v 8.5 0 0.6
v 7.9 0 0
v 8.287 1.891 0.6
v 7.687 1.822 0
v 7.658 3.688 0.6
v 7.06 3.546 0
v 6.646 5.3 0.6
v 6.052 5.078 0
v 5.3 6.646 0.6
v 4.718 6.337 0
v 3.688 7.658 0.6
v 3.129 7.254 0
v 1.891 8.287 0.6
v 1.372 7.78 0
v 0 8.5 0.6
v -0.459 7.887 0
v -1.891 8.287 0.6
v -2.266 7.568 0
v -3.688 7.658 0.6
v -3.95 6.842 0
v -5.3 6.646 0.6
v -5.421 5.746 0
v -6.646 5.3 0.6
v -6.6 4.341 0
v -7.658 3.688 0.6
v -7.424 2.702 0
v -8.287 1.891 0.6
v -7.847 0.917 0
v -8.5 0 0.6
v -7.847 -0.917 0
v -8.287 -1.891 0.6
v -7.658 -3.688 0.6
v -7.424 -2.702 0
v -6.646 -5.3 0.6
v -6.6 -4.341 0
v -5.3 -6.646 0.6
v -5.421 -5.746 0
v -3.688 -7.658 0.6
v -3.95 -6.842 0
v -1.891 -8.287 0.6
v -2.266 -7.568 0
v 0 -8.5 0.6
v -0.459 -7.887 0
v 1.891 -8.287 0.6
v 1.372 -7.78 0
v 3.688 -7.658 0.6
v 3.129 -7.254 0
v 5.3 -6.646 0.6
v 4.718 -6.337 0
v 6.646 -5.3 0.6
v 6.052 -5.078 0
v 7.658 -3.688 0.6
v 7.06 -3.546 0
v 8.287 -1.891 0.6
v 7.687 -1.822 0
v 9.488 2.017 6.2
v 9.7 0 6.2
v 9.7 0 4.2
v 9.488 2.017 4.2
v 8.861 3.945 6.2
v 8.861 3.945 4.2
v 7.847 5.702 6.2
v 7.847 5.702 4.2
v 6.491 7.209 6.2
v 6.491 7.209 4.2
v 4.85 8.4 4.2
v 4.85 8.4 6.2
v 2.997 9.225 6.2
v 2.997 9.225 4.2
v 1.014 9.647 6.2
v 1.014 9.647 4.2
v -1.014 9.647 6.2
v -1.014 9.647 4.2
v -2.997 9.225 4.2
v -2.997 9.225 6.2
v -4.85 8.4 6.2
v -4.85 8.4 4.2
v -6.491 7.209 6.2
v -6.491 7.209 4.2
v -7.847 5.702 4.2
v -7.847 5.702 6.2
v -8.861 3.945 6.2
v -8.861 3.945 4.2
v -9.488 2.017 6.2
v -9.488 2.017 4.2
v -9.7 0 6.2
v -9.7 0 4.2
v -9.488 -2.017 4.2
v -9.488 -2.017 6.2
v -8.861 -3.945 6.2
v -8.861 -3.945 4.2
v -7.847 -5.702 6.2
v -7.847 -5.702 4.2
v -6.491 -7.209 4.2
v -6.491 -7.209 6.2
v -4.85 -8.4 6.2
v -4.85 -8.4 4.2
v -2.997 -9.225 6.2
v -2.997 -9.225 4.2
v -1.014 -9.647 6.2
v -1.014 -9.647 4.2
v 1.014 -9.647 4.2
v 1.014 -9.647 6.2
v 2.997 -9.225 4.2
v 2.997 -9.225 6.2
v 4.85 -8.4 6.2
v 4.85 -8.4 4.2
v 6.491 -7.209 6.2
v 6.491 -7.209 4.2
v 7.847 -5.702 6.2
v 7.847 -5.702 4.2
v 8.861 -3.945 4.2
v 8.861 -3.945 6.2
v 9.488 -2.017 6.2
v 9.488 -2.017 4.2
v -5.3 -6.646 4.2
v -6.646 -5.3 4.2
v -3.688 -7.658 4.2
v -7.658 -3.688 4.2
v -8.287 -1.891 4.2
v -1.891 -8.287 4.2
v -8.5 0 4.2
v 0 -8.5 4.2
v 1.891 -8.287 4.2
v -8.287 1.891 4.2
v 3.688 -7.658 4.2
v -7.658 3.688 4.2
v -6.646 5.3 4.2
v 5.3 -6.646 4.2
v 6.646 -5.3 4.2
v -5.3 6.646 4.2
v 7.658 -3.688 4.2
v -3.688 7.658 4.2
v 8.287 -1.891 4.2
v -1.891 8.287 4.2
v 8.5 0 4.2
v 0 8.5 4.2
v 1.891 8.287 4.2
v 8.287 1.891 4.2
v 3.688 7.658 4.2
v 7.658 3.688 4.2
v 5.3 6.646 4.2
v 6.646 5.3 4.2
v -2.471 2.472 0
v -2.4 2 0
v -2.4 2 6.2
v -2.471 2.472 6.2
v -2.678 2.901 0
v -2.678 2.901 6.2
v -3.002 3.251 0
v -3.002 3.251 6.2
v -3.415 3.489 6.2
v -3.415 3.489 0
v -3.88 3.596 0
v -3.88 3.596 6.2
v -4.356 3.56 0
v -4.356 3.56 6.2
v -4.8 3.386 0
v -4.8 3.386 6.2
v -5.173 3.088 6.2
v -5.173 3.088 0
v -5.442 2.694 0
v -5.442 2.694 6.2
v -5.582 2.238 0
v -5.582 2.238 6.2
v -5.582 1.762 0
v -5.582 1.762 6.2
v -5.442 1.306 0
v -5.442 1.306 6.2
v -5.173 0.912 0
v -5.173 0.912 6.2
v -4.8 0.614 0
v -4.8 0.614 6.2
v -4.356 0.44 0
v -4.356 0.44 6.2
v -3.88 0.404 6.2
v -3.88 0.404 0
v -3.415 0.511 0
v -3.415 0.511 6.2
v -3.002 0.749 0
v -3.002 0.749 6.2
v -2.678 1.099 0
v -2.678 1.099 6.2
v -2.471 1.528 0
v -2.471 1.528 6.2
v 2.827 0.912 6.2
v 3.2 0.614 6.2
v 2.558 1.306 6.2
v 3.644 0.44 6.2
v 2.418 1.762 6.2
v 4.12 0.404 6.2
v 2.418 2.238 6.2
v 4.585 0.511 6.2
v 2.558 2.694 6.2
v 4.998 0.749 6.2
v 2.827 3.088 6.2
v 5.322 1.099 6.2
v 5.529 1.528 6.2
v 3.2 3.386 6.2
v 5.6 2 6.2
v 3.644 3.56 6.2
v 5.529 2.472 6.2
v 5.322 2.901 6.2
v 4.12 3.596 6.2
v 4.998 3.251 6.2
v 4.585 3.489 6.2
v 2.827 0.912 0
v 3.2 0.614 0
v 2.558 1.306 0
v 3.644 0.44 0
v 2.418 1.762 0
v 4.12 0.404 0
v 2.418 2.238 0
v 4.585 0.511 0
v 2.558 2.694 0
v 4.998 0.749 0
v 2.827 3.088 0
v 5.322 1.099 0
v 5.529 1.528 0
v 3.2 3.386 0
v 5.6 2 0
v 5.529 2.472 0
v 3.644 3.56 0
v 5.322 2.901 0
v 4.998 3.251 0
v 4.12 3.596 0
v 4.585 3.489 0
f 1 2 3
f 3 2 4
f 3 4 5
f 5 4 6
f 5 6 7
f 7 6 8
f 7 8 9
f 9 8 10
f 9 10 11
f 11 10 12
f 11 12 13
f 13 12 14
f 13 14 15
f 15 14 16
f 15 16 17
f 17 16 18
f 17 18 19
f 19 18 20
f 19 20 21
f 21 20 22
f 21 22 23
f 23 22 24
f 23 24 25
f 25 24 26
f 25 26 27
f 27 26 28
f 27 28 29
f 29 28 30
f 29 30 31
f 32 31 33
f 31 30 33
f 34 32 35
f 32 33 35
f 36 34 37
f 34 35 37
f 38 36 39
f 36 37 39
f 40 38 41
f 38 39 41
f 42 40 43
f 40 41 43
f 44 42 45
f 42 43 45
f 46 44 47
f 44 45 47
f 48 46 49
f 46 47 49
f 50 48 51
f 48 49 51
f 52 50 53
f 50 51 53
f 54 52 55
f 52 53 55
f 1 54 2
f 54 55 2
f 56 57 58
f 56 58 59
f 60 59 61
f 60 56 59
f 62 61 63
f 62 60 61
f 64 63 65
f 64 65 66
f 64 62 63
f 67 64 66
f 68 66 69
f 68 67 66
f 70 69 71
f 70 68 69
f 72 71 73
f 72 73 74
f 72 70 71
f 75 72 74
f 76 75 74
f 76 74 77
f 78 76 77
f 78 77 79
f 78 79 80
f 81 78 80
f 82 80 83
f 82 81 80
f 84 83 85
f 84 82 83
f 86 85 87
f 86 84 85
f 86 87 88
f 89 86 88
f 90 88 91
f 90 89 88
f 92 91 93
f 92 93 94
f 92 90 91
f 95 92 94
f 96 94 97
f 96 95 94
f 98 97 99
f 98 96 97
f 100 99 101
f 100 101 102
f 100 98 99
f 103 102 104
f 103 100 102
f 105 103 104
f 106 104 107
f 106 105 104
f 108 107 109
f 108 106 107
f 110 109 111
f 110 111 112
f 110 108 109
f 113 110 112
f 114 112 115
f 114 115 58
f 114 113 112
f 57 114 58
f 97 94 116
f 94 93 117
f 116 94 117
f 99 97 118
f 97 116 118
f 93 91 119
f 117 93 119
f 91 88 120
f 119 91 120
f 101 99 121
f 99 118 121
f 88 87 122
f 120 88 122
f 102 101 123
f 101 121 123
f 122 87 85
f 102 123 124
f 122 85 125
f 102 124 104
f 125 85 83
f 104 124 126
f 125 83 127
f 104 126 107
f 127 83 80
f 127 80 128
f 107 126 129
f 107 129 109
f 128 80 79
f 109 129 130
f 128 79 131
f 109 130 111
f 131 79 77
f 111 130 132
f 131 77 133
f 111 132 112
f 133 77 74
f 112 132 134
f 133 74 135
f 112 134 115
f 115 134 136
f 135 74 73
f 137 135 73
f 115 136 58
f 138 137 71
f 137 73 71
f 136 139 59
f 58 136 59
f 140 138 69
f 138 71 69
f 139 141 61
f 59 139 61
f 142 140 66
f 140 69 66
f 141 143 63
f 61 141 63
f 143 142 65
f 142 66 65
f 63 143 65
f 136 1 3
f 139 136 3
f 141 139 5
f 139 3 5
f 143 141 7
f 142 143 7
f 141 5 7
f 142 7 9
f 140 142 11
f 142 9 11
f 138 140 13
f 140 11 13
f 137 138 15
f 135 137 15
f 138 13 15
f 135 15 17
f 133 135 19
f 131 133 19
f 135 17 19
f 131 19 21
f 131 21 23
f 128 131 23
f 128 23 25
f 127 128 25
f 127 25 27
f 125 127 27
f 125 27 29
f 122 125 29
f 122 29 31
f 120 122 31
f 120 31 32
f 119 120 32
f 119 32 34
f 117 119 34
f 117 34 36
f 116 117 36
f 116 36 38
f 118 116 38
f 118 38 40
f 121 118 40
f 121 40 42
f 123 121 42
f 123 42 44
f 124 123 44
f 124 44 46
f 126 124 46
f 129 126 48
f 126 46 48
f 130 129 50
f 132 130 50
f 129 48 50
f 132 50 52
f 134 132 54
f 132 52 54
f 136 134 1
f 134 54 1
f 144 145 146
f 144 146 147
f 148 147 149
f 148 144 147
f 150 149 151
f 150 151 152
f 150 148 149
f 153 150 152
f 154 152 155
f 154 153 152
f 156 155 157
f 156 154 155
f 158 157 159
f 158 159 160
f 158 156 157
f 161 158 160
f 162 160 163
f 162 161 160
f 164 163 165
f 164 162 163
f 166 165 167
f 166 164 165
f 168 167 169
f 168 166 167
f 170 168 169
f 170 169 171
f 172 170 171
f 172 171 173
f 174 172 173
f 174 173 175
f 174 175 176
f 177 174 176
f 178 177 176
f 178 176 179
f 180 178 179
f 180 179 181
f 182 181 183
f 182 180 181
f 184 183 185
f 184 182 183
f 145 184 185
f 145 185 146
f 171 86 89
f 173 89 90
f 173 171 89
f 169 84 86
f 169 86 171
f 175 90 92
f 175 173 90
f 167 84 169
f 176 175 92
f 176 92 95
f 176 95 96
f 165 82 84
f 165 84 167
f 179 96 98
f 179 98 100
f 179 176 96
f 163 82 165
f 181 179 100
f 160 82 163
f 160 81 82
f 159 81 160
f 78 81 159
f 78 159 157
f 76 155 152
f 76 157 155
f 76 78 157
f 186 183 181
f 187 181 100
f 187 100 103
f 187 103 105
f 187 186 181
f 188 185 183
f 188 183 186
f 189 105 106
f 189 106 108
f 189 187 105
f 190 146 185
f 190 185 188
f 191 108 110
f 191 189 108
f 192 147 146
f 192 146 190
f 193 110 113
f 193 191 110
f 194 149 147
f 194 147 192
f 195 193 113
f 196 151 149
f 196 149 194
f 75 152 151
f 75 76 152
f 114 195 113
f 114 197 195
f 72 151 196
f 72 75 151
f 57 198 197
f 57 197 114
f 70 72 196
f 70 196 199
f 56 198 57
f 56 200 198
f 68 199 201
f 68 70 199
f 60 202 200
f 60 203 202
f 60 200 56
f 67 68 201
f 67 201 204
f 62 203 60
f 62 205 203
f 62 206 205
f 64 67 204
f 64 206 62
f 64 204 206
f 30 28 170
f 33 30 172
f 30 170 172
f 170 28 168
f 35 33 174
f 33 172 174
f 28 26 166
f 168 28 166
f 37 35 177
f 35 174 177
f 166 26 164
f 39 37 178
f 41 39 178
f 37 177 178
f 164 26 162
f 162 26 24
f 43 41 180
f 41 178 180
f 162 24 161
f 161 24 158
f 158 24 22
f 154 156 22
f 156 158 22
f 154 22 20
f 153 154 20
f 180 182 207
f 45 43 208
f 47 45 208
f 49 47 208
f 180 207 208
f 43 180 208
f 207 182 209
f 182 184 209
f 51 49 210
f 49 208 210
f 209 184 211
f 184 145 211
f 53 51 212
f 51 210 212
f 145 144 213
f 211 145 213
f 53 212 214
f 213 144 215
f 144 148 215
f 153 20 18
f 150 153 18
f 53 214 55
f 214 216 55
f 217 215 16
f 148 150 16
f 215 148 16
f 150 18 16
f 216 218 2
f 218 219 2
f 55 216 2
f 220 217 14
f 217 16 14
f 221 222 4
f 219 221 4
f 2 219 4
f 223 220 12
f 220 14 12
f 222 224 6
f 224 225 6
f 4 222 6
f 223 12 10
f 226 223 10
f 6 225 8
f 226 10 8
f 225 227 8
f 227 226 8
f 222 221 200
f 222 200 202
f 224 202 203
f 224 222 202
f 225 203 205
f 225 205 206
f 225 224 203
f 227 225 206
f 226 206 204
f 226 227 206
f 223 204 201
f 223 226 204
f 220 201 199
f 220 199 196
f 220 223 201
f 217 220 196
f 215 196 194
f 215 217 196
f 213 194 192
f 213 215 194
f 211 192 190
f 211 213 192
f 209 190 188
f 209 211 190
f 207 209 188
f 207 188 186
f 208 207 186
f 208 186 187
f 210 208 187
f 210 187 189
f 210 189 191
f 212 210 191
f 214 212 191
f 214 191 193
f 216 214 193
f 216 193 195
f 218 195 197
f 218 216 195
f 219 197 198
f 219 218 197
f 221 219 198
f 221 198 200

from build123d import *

# Parameters (mm, degrees)
ESQUISSE1_R        = 8.5
ESQUISSE1_R_2      = 1.6
BOSS_EXTRU_1_DEPTH = 6.2
ESQUISSE2_R        = 9.7
ESQUISSE2_R_2      = 8.5
BOSS_EXTRU_2_DEPTH = 2
CHANFREIN1_SIZE    = 0.6


with BuildPart() as part:
    # Esquisse1 → Boss.-Extru.1 (new body)
    with BuildSketch(Plane.XY):
        Circle(ESQUISSE1_R)
        with Locations((-4, 2)):
            Circle(ESQUISSE1_R_2, mode=Mode.SUBTRACT)
        with Locations((4, 2)):
            Circle(ESQUISSE1_R_2, mode=Mode.SUBTRACT)
    extrude(amount=BOSS_EXTRU_1_DEPTH)

    # Esquisse2 → Boss.-Extru.2 (add)
    with BuildSketch(Plane.XY.offset(6.2)):
        Circle(ESQUISSE2_R)
        Circle(ESQUISSE2_R_2, mode=Mode.SUBTRACT)
    extrude(amount=-BOSS_EXTRU_2_DEPTH)

    # Chanfrein1
    chanfrein1_edges = [part.edges().sort_by_distance(p)[0] for p in [
        (-8.5, 0, 0),
    ]]
    chamfer(chanfrein1_edges, length=CHANFREIN1_SIZE)


solid = part.part
